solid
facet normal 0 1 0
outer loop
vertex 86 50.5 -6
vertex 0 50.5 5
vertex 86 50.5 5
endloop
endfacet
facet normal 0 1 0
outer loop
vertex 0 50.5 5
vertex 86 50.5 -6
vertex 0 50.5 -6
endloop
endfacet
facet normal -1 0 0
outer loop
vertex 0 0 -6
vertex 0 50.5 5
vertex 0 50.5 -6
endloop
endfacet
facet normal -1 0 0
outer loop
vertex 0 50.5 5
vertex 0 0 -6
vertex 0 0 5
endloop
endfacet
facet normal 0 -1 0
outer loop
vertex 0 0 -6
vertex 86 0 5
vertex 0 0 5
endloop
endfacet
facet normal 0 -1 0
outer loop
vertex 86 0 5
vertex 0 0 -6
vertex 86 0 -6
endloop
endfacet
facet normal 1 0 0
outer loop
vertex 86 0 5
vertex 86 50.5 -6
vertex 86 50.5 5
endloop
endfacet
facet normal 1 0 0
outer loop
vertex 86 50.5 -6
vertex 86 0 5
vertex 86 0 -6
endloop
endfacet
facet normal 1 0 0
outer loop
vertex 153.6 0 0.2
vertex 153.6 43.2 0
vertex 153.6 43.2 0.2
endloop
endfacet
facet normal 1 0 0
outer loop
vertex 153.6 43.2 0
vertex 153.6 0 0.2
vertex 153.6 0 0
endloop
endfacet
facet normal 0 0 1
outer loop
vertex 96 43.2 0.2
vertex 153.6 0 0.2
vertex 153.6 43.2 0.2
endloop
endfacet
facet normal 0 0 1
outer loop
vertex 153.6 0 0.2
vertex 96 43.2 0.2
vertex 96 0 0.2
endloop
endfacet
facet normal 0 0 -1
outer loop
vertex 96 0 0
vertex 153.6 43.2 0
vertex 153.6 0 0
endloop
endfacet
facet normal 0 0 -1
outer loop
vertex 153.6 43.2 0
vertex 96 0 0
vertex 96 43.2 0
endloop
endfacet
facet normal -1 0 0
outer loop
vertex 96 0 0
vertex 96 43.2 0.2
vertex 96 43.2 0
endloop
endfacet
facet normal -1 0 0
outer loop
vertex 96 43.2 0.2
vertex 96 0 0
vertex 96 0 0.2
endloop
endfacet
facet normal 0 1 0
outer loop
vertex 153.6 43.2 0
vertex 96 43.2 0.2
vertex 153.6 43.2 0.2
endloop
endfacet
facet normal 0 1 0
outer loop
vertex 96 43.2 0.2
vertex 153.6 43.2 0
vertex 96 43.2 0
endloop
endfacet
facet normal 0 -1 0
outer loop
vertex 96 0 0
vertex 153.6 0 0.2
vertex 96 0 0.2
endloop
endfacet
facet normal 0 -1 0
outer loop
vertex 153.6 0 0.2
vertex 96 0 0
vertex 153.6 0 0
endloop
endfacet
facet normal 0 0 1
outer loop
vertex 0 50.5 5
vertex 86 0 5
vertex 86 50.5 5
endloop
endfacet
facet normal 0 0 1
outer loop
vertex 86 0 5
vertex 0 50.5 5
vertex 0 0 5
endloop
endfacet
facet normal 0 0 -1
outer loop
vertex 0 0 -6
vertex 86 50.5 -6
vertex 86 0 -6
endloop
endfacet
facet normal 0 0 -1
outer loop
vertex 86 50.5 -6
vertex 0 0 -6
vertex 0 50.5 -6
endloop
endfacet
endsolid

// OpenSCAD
// file: cyd_dimensions.scad
// ESP32-2432S028R reference based on physical board measurements, millimeters.
// Coordinate origin: lower-left PCB corner viewed from the display side.
// X follows the 86 mm edge, Y follows the 50.5 mm edge; +Z faces the display.
// Nominal reference values; see verification flags for measurements on this unit.
// Measured edge-to-edge on a sample board; overrides manufacturer 86 x 50.
pcb_width = 86.0;
pcb_height = 50.5;
pcb_outline_verified = true;
mount_hole_diameter = 3.2;
// Four-hole layout accepted after a successful physical alignment print.
// Right margin 3.5 and top margin 4.5, not all margins 4.
mount_origin = [4,4];
mount_hole_centers = [for (y = [0,42]) for (x = [0,78.5])
                     [mount_origin[0]+x,mount_origin[1]+y]];
active_display_size = [57.6,43.2]; // Illuminated area ONLY, not frame size.
// Earlier 70 x 51 frame / flush edges conflict with latest PCB measurements.
display_frame_outline = undef;
display_frame_xy = undef;
display_frame_outline_verified = false;

// Corrected hole center spacing from a physical sample board.
mount_center_spacing = [78.5,42.0];
mount_center_spacing_verified = true;
// Spacing confirmation alone does not measure diameter or offsets from PCB edges.
mount_edge_offsets_verified = true; // Physical gauge fit, not caliper precision.
mount_hole_diameter_verified = false;
mounting_pattern_verified = mount_center_spacing_verified &&
                            mount_edge_offsets_verified && mount_hole_diameter_verified;

// Leave these undefined until verified on the actual dual-USB board.
pcb_thickness = 1.0;
glass_above_pcb_front = 4.0;
fit_test_opening = [70.0,50.5]; // Accepted opening; not a glass precision measurement.
fit_test_opening_xy = [8.0,0.0];
display_frame_size = undef;       // [width,height,depth]
display_frame_position = undef;   // [x,y,z] lower-left/back of outer frame
active_display_position = undef;  // [x,y,z] lower-left of illuminated area
total_assembly_thickness = 11.0;
assembly_z_min = -6.0; // PCB + rear components = 7 mm; PCB itself = 1 mm.

// Each opening is [x,y,z,width,height,depth] in board coordinates.
// Include plug/finger/card travel clearance when sizing enclosure cutouts.
usb_c_cutout = undef;
micro_usb_cutout = undef;
microsd_access = undef;
boot_button_access = undef;
reset_button_access = undef;
// main file
// Open this file and press F5. No assumed USB/frame/button geometry is drawn.
include <cyd_dimensions.scad>

mode = "reference"; // "reference" = visual reference; "footprint" = exact 2D PCB
require_verified = false; // Keep false for reference work; true enforces known fit data.
$fn = 64;

// Rendering aids ONLY; neither is a measured physical thickness.
reference_sheet_thickness = 0.4;
reference_active_sheet_thickness = 0.2;

assert(pcb_width > 0 && pcb_height > 0 && mount_hole_diameter > 0);
if (!is_undef(display_frame_xy) && !is_undef(display_frame_outline))
assert(display_frame_xy[0] >= 0 && display_frame_xy[1] >= 0 &&
       display_frame_xy[0] + display_frame_outline[0] <= pcb_width &&
       display_frame_xy[1] + display_frame_outline[1] <= pcb_height,
       "Display frame outline extends beyond the measured PCB.");
assert(len(mount_hole_centers) == 4, "Expected four mounting holes.");
assert(mount_hole_centers[1][0] - mount_hole_centers[0][0] == mount_center_spacing[0] &&
       mount_hole_centers[3][0] - mount_hole_centers[2][0] == mount_center_spacing[0] &&
       mount_hole_centers[2][1] - mount_hole_centers[0][1] == mount_center_spacing[1] &&
       mount_hole_centers[3][1] - mount_hole_centers[1][1] == mount_center_spacing[1],
       "Hole coordinates must agree with the recorded center spacing.");
for (p = mount_hole_centers)
    assert(p[0] >= mount_hole_diameter/2 &&
           p[0] <= pcb_width - mount_hole_diameter/2 &&
           p[1] >= mount_hole_diameter/2 &&
           p[1] <= pcb_height - mount_hole_diameter/2,
           "Mounting hole crosses a PCB edge.");

if (require_verified) {
    assert(mounting_pattern_verified, "Verify mounting holes on actual USB-C revision first.");
    assert(!is_undef(pcb_thickness) && !is_undef(display_frame_size) &&
           !is_undef(display_frame_position) && !is_undef(active_display_position) &&
           !is_undef(total_assembly_thickness) && !is_undef(assembly_z_min) &&
           !is_undef(usb_c_cutout) && !is_undef(micro_usb_cutout) &&
           !is_undef(microsd_access) && !is_undef(boot_button_access) &&
           !is_undef(reset_button_access), "Fit-critical parameters remain unverified.");
}

module cyd_pcb_footprint() {
    difference() {
        square([pcb_width, pcb_height]);
        for (p = mount_hole_centers)
            translate(p) circle(d = mount_hole_diameter);
    }
}

module access_reference(box) {
    if (!is_undef(box))
        color([1,0.4,0,0.45])
            translate([box[0],box[1],box[2]]) cube([box[3],box[4],box[5]]);
}

module cyd_reference() {
    color("Goldenrod")
        linear_extrude(height = is_undef(pcb_thickness) ? reference_sheet_thickness : pcb_thickness)
            cyd_pcb_footprint();

    if (!is_undef(display_frame_size) && !is_undef(display_frame_position))
        color([0.35,0.35,0.35,0.6])
            translate(display_frame_position) cube(display_frame_size);
    else if (!is_undef(display_frame_xy) && !is_undef(display_frame_outline))
        // Measured XY outline only. Ring thickness/Z placement are visualization aids.
        color("DimGray")
            translate([display_frame_xy[0],display_frame_xy[1],
                       is_undef(pcb_thickness) ? reference_sheet_thickness : pcb_thickness])
                linear_extrude(height = reference_active_sheet_thickness)
                    difference() {
                        square(display_frame_outline);
                        translate([0.5,0.5])
                            square([display_frame_outline[0]-1,display_frame_outline[1]-1]);
                    }

    // With no measured position, show the active area BESIDE the PCB, not centered on it.
    color("SteelBlue")
        translate(is_undef(active_display_position) ? [pcb_width + 10,0,0] : active_display_position)
            cube([active_display_size[0],active_display_size[1],reference_active_sheet_thickness]);

    if (!is_undef(total_assembly_thickness) && !is_undef(assembly_z_min))
        color([0.2,0.8,0.7,0.15])
            translate([0,0,assembly_z_min])
                cube([pcb_width,pcb_height,total_assembly_thickness]);

    for (box = [usb_c_cutout,micro_usb_cutout,microsd_access,boot_button_access,reset_button_access])
        access_reference(box);
}

if (mode == "footprint") cyd_pcb_footprint();
else {
    assert(mode == "reference", "Choose reference or footprint mode.");
    cyd_reference();
}
echo("Provisional hole centers:", mount_hole_centers, "nominal diameter:", mount_hole_diameter);
echo("Measured PCB:", [pcb_width,pcb_height], "frame XY:", display_frame_outline, display_frame_xy);
echo("Hole edge offsets remain provisional pending physical alignment test.");
echo("USB-C revision mounting pattern verified:", mounting_pattern_verified);
echo("Actual board center spacing:", mount_center_spacing,
     "verified:", mount_center_spacing_verified);
if (is_undef(pcb_thickness)) echo("PCB is a 0.4 mm VISUAL sheet, not a measured thickness.");
if (is_undef(active_display_position)) echo("Blue active area is shown separately because its position is UNKNOWN.");
